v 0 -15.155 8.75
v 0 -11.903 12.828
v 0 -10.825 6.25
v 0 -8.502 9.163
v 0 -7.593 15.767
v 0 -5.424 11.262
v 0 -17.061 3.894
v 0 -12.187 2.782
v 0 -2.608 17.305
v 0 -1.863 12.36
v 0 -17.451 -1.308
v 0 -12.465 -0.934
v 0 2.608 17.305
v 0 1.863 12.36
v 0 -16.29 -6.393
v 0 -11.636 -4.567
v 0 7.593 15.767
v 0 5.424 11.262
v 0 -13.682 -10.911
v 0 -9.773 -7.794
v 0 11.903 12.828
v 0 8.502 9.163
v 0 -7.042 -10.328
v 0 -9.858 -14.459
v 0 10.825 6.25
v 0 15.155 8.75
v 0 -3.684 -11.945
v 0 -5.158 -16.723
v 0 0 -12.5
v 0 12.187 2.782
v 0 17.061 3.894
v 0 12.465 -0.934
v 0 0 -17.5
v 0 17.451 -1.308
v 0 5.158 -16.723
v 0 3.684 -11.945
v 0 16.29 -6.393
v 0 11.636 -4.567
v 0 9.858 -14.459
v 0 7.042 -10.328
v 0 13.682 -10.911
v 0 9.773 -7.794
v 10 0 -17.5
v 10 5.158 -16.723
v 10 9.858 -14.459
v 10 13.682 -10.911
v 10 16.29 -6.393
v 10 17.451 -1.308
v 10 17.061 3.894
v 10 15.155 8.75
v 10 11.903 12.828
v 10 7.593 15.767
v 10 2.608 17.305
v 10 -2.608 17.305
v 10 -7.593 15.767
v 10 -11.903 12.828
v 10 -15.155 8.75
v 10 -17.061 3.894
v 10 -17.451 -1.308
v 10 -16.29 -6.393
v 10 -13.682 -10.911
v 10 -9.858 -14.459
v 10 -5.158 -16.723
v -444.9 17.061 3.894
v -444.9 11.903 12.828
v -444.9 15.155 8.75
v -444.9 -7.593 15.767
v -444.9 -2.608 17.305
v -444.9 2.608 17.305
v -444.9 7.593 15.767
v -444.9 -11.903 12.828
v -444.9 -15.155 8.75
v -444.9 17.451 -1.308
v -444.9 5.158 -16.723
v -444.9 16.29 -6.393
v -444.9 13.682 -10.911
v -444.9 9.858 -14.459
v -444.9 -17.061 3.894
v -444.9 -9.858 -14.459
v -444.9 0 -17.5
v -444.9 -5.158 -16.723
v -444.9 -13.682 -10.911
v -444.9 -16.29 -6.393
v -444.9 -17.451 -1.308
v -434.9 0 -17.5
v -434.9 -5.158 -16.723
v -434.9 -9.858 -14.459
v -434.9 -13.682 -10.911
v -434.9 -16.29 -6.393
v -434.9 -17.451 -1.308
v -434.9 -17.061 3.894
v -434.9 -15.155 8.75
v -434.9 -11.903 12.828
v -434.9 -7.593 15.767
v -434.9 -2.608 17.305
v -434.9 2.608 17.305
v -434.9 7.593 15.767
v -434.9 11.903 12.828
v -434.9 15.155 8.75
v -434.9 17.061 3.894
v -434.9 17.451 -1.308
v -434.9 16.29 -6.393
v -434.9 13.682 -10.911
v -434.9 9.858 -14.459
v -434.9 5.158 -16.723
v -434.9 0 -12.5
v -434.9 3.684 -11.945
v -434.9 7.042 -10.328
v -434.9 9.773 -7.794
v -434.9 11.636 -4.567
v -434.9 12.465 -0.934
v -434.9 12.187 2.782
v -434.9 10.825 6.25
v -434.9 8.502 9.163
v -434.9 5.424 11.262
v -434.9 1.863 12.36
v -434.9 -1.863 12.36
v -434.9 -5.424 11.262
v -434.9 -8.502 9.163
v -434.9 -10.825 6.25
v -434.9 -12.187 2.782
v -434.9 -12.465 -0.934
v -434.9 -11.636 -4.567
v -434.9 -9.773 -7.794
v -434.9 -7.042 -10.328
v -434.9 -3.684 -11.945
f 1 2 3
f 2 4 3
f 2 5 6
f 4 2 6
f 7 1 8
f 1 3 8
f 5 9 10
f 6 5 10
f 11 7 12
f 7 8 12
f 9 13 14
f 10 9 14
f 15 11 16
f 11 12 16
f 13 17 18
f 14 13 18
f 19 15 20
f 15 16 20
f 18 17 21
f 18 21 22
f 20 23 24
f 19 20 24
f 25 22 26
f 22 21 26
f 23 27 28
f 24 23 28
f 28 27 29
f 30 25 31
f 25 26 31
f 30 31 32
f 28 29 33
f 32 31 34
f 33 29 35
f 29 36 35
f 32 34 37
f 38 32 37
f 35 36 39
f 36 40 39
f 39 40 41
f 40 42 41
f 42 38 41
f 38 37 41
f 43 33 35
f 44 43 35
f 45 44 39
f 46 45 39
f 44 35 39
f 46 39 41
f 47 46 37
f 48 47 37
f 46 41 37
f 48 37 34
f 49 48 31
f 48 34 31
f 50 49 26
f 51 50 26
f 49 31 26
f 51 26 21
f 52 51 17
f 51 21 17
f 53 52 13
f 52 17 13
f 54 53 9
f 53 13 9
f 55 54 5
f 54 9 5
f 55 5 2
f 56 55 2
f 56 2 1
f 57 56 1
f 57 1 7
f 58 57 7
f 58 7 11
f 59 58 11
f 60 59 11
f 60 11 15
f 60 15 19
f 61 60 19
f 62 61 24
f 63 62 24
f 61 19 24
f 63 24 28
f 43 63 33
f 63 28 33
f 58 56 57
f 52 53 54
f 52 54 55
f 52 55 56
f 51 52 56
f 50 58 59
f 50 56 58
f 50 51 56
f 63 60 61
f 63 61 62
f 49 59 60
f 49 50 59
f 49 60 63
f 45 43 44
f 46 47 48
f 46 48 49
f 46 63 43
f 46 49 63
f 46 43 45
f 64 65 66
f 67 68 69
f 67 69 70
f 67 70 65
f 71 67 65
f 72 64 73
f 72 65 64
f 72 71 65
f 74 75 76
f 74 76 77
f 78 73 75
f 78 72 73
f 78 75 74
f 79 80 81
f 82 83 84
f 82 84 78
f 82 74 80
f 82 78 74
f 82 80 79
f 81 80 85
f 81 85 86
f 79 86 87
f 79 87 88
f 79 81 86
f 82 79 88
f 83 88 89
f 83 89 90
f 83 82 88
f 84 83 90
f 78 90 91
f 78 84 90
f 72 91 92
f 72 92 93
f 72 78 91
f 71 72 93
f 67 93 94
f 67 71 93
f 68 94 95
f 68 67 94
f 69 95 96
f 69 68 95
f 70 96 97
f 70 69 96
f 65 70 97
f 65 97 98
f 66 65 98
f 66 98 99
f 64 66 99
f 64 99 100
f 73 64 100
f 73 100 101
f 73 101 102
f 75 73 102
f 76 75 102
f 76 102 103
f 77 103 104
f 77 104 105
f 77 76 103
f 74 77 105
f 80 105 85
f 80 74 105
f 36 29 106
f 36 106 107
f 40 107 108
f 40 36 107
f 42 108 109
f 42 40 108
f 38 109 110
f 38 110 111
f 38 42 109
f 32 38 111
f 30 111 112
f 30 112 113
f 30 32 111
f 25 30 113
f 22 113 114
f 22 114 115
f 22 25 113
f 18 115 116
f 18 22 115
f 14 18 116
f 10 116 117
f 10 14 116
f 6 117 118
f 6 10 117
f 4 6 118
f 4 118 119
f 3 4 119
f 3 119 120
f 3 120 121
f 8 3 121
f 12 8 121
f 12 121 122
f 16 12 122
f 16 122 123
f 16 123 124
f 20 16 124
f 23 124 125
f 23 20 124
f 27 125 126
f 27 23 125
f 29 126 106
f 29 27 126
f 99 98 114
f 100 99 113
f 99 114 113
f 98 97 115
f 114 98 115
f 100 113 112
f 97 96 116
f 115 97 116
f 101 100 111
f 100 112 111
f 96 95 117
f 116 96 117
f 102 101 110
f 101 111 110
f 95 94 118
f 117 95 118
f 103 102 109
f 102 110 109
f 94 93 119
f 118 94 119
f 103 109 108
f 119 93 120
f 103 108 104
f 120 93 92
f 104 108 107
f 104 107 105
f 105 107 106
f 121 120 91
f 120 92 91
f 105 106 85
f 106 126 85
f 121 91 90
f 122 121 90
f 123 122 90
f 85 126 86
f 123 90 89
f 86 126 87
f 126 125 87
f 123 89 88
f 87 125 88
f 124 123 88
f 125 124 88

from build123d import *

# Parameters (mm, degrees)
SKETCH1_R           = 12.5
BOSS_EXTRUDE1_DEPTH = 434.9
SKETCH3_R           = 17.5
BOSS_EXTRUDE3_DEPTH = 10
BOSS_EXTRUDE4_START = 10
SKETCH4_R           = 17.5
BOSS_EXTRUDE4_DEPTH = 10


with BuildPart() as part:
    # Sketch1 → Boss-Extrude1 (new body)
    with BuildSketch(Plane(origin=(0, 0, 0), x_dir=(0, 0, -1), z_dir=(1, 0, 0))):
        Circle(SKETCH1_R)
    extrude(amount=-BOSS_EXTRUDE1_DEPTH)

    # Sketch3 → Boss-Extrude3 (add)
    with BuildSketch(Plane(origin=(0, 0, 0), x_dir=(0, 0, -1), z_dir=(1, 0, 0))):
        Circle(SKETCH3_R)
    extrude(amount=BOSS_EXTRUDE3_DEPTH)

    # Sketch4 → Boss-Extrude4 (add)
    with BuildSketch(Plane.ZY.offset(434.9).offset(BOSS_EXTRUDE4_START)):
        with Locations(Location((0, 0, 0), (0, 0, 180))):
            Circle(SKETCH4_R)
    extrude(amount=-BOSS_EXTRUDE4_DEPTH)


solid = part.part
